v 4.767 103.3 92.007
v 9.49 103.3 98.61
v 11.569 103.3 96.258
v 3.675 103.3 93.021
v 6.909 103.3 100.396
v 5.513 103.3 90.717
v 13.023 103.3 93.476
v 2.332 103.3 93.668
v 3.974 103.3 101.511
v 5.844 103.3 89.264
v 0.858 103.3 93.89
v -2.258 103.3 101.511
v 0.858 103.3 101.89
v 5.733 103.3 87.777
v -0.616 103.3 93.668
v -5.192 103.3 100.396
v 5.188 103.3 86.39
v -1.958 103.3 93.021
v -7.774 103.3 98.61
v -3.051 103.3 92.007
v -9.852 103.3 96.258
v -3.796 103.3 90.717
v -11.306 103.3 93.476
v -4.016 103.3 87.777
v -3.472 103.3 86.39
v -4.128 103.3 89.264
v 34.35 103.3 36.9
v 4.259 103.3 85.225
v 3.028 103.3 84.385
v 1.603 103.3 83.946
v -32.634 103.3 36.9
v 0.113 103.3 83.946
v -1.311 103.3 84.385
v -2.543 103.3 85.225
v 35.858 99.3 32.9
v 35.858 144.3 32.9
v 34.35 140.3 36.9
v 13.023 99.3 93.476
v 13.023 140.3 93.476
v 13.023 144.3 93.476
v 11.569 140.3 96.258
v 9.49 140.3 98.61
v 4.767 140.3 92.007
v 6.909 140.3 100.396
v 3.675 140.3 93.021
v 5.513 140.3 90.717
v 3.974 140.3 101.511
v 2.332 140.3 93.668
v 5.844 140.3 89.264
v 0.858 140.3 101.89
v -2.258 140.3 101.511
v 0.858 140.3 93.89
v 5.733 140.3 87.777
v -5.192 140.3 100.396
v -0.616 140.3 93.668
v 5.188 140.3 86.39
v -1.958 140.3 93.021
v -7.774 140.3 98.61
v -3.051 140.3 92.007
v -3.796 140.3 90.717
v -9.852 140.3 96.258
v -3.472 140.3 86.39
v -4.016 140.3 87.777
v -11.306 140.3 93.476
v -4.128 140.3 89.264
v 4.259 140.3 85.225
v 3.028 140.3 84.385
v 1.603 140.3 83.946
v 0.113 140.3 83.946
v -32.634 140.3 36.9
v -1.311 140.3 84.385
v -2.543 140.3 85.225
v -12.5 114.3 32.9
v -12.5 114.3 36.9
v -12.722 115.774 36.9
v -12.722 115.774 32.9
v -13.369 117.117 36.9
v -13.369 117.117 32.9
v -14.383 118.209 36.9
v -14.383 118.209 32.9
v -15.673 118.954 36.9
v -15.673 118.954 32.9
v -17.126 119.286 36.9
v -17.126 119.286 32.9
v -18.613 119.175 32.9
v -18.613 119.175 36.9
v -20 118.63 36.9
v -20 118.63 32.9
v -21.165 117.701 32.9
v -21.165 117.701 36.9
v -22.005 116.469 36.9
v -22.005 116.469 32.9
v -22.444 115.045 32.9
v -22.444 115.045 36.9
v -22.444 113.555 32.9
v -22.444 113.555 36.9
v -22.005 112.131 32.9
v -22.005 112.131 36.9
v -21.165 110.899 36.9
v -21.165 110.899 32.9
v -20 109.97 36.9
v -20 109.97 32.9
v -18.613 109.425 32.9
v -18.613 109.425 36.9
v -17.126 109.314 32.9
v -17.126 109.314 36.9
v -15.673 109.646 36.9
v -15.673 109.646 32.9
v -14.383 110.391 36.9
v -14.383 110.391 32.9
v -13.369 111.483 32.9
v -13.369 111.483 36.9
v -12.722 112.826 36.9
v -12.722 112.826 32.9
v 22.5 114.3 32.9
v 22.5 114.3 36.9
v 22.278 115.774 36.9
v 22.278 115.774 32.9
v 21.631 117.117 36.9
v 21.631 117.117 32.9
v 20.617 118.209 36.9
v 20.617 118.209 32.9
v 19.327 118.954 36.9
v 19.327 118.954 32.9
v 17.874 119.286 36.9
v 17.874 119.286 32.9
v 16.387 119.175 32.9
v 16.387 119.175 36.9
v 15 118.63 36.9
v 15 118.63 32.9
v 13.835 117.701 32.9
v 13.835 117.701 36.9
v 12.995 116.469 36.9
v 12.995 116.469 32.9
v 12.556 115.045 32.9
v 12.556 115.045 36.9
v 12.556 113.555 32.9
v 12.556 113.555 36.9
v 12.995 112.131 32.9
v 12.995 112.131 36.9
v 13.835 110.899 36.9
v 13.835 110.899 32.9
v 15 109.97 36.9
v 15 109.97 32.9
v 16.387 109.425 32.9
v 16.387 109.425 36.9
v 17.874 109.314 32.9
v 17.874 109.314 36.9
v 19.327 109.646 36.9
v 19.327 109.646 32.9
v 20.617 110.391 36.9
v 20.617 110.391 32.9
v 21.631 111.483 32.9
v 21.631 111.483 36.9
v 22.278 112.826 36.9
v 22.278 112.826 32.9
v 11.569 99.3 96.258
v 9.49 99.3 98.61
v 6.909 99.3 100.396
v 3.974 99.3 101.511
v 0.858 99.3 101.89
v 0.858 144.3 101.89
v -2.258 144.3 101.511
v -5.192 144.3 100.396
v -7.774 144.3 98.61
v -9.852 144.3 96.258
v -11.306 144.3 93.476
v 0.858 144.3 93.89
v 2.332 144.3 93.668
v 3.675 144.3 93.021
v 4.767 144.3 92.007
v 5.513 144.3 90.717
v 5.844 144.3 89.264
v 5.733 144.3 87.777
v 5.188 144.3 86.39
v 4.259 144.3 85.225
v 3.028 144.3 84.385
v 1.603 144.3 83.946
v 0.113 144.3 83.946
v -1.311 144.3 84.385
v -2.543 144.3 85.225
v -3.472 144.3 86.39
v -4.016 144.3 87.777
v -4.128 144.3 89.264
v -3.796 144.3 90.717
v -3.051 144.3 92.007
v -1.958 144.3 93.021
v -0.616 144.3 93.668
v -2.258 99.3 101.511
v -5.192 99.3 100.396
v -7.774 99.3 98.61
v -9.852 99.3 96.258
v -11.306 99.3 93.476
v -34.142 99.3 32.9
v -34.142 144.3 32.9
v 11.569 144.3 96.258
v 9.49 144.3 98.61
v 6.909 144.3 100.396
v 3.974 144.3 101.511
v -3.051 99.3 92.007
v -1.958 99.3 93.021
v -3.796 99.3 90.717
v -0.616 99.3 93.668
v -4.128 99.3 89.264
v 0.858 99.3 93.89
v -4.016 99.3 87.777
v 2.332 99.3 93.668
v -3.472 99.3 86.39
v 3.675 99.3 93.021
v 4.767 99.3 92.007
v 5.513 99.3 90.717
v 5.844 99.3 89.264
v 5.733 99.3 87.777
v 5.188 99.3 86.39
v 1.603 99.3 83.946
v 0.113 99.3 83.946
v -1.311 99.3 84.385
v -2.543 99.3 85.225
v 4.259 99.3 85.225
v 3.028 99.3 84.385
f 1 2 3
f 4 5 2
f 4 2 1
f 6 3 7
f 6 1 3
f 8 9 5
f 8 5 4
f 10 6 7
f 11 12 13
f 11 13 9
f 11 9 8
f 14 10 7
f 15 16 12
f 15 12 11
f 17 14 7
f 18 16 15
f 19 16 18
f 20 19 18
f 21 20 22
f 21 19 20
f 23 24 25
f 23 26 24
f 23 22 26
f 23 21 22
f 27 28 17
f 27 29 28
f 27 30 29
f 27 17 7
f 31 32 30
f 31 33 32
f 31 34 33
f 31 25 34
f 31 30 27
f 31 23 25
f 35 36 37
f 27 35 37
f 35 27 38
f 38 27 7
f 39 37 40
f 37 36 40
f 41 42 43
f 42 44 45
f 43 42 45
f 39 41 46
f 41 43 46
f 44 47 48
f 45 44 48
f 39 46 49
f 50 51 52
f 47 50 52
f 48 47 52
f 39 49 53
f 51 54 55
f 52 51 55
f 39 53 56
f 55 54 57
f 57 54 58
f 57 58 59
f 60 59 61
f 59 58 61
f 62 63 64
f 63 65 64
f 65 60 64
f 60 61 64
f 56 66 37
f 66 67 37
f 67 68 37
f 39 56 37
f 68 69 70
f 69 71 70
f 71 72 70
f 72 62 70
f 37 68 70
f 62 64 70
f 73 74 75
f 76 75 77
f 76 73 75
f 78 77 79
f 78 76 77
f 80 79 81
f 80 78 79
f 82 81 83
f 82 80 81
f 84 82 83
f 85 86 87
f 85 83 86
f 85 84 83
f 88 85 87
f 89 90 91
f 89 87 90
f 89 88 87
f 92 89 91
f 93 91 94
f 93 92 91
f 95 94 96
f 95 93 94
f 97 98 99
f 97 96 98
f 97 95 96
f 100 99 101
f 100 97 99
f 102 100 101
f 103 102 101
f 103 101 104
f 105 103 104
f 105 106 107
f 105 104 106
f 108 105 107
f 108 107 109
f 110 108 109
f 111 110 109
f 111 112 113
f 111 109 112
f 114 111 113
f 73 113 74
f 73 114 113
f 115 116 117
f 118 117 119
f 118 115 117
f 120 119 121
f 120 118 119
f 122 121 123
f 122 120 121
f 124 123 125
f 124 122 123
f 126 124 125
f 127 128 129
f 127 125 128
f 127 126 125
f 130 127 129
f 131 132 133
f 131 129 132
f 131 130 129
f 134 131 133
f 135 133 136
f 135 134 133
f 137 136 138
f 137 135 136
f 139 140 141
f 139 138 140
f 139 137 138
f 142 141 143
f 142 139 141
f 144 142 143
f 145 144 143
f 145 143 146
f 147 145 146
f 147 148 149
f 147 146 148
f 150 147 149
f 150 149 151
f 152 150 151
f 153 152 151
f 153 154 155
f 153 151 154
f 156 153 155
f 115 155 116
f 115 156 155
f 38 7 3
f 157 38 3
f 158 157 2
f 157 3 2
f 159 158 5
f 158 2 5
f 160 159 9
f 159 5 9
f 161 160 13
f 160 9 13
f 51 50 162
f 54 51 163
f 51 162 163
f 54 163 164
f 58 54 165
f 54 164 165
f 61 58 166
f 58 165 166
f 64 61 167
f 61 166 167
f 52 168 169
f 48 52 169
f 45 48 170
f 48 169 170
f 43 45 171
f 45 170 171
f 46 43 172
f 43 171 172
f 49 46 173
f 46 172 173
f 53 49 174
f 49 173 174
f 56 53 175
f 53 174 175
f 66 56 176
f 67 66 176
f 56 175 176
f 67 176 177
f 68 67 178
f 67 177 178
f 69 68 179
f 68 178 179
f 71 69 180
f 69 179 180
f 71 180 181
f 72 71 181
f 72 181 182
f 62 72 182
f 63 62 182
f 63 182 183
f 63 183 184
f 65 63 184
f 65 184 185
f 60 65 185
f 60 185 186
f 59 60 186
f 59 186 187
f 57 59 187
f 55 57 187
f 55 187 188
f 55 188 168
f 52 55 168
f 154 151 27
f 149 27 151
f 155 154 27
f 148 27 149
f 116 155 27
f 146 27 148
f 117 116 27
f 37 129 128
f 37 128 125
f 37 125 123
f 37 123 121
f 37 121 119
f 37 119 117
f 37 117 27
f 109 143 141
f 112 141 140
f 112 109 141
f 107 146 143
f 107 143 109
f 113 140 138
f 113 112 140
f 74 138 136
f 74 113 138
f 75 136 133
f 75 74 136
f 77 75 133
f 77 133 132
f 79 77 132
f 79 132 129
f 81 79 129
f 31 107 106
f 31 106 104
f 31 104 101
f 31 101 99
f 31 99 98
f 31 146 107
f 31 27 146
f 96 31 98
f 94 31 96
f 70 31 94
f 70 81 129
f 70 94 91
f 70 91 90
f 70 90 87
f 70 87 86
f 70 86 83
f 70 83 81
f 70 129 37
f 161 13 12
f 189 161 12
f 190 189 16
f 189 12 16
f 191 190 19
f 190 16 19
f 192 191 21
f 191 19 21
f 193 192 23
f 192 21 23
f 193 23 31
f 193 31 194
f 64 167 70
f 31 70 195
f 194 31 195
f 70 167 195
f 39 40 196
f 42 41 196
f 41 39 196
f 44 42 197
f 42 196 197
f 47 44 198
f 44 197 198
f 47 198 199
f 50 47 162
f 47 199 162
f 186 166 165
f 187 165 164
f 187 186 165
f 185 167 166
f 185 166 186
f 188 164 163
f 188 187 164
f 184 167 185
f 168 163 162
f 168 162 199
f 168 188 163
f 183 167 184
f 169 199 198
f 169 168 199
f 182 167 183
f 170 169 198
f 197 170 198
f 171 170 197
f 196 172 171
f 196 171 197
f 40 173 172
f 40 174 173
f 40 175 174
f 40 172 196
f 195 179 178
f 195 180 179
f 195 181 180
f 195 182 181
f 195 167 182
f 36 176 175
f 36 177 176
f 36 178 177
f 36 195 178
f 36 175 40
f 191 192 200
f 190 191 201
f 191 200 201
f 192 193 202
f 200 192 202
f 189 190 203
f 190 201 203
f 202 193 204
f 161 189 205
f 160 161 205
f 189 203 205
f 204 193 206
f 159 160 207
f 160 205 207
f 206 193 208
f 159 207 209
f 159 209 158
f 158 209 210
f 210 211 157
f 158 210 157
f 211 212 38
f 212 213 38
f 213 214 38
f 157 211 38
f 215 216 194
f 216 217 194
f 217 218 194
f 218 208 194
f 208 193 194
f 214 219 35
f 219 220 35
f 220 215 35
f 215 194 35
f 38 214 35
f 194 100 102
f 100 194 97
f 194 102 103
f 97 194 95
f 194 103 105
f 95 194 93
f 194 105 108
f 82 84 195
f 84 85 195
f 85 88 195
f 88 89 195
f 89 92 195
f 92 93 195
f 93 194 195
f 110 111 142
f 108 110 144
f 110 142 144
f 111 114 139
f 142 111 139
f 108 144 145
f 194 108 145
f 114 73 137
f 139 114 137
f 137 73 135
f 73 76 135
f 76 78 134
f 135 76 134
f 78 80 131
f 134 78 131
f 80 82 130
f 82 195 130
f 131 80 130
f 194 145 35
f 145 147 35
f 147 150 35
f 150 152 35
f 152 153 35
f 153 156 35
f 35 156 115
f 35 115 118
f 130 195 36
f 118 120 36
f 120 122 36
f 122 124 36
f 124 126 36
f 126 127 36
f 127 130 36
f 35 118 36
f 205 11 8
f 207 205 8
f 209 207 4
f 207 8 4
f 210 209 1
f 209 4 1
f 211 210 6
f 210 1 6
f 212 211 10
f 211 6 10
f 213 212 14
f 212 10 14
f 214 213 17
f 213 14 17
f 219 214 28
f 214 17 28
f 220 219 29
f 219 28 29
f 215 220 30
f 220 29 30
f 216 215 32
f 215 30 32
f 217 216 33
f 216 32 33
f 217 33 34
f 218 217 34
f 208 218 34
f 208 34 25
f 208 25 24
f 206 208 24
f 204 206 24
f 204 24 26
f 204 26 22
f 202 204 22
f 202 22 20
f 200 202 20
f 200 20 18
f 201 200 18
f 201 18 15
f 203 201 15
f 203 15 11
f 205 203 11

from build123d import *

# Parameters (mm, degrees)
SKETCH1_W               = 70
SKETCH1_H               = 45
SKETCH1_R               = 5
BOSS_EXTRUDE1_DEPTH     = 70
SKETCH2_R               = 5
CUT_EXTRUDE1_DEPTH      = 70
CUT_EXTRUDE2_DEPTH      = 181.24938524
CUT_EXTRUDE2_DEPTH_BACK = 181.24938524
SKETCH3_W               = 72.235560481
SKETCH3_H               = 37


with BuildPart() as part:
    # Sketch1 → Boss-Extrude1 (new body)
    with BuildSketch(Plane.XY.offset(32.9)):
        with Locations((0.858254713, 121.799876296)):
            Rectangle(SKETCH1_W, SKETCH1_H)
        with Locations((-17.5, 114.3)):
            Circle(SKETCH1_R, mode=Mode.SUBTRACT)
        with Locations((17.5, 114.3)):
            Circle(SKETCH1_R, mode=Mode.SUBTRACT)
    extrude(amount=BOSS_EXTRUDE1_DEPTH)

    # Sketch2 → Cut-Extrude1 (cut)
    with BuildSketch(Plane(origin=(0, 144.299876296, 0), x_dir=(1, 0, 0), z_dir=(0, 1, 0))):
        with BuildLine():
            Line((0.858254713, -101.89), (0.858254713, -102.9))
            Line((0.858254713, -102.9), (35.858254713, -102.9))
            Line((35.858254713, -102.9), (35.858254713, -32.9))
            Line((35.858254713, -32.9), (13.022608826, -93.475683049))
            ThreePointArc((13.022608826, -93.475683049), (8.253730369, -99.581442364), (0.858254713, -101.89))
        make_face()
        with BuildLine():
            Line((-34.141745287, -102.9), (0.858254713, -102.9))
            Line((0.858254713, -102.9), (0.858254713, -101.89))
            ThreePointArc((0.858254713, -101.89), (-6.537220943, -99.581442364), (-11.306099399, -93.475683049))
            Line((-11.306099399, -93.475683049), (-34.141745287, -32.9))
            Line((-34.141745287, -32.9), (-34.141745287, -102.9))
        make_face()
        with Locations(Location((0.858254713, -88.89, 0), (0, 0, 270))):
            Circle(SKETCH2_R)
    extrude(amount=-CUT_EXTRUDE1_DEPTH, mode=Mode.SUBTRACT)

    # Sketch3 → Cut-Extrude2 (cut, two sides: drawn at the far end of the back side and taken through both)
    with BuildSketch(Plane(origin=(0, 0, 0), x_dir=(0, 0, -1), z_dir=(1, 0, 0)).offset(-CUT_EXTRUDE2_DEPTH_BACK)):
        with Locations((-73.017780241, 121.799876296)):
            Rectangle(SKETCH3_W, SKETCH3_H)
    extrude(amount=CUT_EXTRUDE2_DEPTH + CUT_EXTRUDE2_DEPTH_BACK, mode=Mode.SUBTRACT)


solid = part.part
